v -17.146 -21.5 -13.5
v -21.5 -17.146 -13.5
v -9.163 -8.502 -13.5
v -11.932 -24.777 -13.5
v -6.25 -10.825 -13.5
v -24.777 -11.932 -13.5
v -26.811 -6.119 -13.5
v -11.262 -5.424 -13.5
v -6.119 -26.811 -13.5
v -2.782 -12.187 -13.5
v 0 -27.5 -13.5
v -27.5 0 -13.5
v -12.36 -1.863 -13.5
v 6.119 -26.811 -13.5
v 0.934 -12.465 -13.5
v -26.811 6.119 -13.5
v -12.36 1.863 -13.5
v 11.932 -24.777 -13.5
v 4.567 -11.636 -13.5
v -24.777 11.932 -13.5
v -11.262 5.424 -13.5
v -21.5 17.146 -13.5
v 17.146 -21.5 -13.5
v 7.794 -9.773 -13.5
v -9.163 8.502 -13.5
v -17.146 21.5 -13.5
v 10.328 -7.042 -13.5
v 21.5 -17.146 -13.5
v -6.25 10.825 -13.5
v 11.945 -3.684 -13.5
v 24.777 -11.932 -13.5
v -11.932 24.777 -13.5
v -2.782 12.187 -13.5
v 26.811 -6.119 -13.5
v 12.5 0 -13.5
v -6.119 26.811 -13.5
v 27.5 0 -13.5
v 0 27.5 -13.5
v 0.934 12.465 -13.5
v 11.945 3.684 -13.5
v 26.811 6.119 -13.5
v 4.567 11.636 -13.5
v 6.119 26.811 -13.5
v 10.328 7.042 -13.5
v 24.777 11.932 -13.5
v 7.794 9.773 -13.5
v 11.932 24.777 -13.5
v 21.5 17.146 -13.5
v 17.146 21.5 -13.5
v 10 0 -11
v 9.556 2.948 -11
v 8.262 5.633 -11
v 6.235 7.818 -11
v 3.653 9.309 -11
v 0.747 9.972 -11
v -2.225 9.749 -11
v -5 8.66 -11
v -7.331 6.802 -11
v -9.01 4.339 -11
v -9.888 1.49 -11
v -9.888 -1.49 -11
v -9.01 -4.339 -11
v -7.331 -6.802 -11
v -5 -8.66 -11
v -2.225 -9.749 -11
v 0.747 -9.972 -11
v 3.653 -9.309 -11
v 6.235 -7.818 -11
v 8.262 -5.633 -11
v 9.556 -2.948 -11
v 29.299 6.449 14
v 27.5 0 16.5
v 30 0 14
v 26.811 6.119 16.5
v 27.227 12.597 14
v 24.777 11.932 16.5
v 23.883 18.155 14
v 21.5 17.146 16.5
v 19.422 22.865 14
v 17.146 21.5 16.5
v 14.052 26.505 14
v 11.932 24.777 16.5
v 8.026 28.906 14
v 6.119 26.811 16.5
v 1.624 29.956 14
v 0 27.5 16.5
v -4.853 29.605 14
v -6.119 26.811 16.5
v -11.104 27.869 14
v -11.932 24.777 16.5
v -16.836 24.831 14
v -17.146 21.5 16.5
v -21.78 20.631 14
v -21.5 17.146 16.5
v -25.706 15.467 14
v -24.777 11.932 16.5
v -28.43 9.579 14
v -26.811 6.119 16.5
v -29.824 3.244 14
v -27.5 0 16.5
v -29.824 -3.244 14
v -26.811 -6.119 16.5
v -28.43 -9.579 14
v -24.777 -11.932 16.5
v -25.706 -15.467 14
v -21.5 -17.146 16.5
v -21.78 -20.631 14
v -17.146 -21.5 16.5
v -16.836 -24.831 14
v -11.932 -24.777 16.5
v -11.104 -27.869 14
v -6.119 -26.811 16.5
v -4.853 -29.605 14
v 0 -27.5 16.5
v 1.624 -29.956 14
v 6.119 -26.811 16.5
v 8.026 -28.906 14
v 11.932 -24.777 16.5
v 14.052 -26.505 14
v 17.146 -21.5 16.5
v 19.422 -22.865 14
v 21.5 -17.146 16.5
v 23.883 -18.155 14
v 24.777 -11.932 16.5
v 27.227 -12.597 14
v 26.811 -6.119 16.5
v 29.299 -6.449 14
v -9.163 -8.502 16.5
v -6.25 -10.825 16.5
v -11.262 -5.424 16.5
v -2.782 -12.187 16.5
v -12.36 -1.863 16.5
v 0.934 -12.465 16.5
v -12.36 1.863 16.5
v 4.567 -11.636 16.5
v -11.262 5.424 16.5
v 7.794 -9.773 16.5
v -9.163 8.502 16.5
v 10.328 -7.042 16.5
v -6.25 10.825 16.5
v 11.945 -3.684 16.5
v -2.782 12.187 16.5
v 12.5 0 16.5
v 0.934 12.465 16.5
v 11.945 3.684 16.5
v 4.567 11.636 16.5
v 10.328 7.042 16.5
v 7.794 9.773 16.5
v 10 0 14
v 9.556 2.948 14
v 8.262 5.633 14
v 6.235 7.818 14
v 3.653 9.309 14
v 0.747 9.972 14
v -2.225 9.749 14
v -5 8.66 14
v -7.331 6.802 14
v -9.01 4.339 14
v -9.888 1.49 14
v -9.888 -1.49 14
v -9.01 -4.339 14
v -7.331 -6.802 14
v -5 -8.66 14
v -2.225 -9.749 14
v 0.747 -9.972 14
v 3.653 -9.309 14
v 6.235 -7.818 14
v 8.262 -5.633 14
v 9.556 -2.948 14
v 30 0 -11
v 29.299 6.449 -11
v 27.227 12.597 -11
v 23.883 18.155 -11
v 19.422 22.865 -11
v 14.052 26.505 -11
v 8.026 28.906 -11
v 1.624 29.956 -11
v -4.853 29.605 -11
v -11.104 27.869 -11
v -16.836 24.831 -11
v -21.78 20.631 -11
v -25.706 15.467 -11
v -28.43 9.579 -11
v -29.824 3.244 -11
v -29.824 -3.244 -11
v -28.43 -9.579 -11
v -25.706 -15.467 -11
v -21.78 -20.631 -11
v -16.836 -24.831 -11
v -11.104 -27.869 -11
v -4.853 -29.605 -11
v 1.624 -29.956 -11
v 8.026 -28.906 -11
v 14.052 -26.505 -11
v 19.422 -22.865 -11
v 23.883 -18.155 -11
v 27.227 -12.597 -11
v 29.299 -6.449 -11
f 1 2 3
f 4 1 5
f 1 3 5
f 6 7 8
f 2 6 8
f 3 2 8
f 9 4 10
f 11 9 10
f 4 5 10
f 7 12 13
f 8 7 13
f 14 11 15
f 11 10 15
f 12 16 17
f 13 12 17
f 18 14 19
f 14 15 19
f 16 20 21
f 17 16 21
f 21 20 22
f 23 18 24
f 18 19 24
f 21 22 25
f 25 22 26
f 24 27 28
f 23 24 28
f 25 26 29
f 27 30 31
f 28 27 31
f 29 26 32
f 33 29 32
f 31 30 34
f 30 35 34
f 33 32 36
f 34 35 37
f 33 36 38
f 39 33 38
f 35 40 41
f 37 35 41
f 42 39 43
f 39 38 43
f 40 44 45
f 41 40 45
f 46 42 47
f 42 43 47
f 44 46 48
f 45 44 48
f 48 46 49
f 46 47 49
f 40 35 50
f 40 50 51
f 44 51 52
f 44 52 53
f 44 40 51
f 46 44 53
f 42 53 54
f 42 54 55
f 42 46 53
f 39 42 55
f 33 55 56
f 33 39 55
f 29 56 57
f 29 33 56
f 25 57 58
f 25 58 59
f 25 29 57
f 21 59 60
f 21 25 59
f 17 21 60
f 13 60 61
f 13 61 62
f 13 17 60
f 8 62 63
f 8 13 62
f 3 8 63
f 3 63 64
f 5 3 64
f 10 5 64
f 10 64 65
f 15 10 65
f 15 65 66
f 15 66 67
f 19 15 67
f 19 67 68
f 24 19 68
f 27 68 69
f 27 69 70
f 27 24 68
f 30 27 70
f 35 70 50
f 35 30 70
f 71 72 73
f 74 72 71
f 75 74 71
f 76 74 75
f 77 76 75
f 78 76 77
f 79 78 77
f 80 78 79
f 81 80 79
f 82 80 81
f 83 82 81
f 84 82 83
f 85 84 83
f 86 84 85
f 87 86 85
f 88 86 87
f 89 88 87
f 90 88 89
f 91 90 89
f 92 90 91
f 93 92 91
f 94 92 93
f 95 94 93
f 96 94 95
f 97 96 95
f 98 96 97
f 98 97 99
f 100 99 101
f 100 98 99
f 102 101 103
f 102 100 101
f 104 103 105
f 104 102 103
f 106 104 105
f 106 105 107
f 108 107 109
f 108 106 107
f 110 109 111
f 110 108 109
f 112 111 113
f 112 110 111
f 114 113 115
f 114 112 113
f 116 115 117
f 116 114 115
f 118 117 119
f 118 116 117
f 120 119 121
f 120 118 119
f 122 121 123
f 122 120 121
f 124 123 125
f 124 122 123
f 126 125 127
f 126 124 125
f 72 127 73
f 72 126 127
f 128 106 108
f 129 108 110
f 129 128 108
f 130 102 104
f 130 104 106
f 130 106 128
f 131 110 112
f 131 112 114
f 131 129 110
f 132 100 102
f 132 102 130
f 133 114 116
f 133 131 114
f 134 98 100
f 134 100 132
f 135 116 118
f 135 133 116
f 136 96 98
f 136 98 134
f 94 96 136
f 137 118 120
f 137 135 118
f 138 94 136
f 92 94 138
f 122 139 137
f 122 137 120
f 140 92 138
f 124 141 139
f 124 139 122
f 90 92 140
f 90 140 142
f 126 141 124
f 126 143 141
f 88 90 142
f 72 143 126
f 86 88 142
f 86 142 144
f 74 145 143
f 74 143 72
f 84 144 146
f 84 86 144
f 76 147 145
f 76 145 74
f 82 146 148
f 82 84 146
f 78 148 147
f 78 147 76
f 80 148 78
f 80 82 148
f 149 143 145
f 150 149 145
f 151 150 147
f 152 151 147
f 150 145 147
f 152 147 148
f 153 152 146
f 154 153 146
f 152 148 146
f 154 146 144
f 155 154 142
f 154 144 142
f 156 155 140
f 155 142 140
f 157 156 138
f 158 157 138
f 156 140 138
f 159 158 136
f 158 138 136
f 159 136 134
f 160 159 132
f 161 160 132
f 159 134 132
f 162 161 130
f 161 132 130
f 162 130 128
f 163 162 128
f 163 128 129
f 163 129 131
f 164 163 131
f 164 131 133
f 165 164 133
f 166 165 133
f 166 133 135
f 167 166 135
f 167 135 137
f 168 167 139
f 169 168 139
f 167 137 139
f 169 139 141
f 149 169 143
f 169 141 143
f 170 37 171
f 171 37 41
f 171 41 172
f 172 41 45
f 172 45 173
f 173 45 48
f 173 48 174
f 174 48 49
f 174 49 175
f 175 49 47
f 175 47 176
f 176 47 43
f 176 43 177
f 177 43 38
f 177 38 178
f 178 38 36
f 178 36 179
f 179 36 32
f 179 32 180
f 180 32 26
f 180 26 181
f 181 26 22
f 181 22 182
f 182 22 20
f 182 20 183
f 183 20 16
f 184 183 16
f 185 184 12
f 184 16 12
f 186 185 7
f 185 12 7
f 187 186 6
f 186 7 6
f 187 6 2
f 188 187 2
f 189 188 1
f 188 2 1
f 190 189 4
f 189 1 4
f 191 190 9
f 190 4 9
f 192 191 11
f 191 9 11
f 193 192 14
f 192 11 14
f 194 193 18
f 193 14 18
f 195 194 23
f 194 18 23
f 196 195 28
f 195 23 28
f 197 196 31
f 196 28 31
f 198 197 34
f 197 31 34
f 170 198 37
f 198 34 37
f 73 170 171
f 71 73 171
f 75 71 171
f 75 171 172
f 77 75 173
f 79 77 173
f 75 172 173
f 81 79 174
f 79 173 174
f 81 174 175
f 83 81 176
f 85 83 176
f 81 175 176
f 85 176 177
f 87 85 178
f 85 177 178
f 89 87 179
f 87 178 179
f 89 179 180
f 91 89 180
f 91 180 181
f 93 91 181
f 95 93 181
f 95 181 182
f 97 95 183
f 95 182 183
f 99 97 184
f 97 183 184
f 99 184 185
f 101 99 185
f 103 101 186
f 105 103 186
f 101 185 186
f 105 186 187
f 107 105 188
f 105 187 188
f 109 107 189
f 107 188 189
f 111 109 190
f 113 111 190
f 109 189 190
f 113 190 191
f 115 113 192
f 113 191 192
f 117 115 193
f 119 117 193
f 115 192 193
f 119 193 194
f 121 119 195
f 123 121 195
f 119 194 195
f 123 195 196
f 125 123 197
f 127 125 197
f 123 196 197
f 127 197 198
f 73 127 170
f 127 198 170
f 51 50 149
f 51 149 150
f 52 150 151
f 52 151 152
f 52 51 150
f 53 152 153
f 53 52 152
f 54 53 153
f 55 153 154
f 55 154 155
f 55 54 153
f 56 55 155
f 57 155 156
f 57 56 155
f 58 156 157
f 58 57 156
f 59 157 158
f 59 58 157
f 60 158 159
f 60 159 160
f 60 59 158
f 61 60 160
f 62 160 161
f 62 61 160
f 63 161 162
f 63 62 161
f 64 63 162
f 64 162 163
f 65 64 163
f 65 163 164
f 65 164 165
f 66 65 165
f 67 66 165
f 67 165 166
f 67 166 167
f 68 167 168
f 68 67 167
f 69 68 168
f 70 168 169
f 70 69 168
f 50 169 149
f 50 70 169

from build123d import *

# Parameters (mm, degrees)
SKETCH1_R           = 3
SKETCH1_R_2         = 1
EXTRUDE_THIN1_DEPTH = 3
CHAMFER1_SIZE       = 0.25
SCALE1_SCALE        = 10


with BuildPart() as part:
    # Sketch1 → Extrude-Thin1 (new body)
    with BuildSketch(Plane.XY):
        Circle(SKETCH1_R)
        Circle(SKETCH1_R_2, mode=Mode.SUBTRACT)
    extrude(amount=EXTRUDE_THIN1_DEPTH)

    # Chamfer1
    chamfer1_edges = [part.edges().sort_by_distance(p)[0] for p in [
        (-3, 0, 0),
        (-1, 0, 0),
        (-3, 0, 3),
        (-1, 0, 3),
    ]]
    chamfer(chamfer1_edges, length=CHAMFER1_SIZE)


with BuildPart() as part_1:
    # Scale1: scaled about (0, 0, 1.5)
    add(part.part.scale(SCALE1_SCALE).moved(Location((0, 0, -13.5))))


solid = part_1.part
